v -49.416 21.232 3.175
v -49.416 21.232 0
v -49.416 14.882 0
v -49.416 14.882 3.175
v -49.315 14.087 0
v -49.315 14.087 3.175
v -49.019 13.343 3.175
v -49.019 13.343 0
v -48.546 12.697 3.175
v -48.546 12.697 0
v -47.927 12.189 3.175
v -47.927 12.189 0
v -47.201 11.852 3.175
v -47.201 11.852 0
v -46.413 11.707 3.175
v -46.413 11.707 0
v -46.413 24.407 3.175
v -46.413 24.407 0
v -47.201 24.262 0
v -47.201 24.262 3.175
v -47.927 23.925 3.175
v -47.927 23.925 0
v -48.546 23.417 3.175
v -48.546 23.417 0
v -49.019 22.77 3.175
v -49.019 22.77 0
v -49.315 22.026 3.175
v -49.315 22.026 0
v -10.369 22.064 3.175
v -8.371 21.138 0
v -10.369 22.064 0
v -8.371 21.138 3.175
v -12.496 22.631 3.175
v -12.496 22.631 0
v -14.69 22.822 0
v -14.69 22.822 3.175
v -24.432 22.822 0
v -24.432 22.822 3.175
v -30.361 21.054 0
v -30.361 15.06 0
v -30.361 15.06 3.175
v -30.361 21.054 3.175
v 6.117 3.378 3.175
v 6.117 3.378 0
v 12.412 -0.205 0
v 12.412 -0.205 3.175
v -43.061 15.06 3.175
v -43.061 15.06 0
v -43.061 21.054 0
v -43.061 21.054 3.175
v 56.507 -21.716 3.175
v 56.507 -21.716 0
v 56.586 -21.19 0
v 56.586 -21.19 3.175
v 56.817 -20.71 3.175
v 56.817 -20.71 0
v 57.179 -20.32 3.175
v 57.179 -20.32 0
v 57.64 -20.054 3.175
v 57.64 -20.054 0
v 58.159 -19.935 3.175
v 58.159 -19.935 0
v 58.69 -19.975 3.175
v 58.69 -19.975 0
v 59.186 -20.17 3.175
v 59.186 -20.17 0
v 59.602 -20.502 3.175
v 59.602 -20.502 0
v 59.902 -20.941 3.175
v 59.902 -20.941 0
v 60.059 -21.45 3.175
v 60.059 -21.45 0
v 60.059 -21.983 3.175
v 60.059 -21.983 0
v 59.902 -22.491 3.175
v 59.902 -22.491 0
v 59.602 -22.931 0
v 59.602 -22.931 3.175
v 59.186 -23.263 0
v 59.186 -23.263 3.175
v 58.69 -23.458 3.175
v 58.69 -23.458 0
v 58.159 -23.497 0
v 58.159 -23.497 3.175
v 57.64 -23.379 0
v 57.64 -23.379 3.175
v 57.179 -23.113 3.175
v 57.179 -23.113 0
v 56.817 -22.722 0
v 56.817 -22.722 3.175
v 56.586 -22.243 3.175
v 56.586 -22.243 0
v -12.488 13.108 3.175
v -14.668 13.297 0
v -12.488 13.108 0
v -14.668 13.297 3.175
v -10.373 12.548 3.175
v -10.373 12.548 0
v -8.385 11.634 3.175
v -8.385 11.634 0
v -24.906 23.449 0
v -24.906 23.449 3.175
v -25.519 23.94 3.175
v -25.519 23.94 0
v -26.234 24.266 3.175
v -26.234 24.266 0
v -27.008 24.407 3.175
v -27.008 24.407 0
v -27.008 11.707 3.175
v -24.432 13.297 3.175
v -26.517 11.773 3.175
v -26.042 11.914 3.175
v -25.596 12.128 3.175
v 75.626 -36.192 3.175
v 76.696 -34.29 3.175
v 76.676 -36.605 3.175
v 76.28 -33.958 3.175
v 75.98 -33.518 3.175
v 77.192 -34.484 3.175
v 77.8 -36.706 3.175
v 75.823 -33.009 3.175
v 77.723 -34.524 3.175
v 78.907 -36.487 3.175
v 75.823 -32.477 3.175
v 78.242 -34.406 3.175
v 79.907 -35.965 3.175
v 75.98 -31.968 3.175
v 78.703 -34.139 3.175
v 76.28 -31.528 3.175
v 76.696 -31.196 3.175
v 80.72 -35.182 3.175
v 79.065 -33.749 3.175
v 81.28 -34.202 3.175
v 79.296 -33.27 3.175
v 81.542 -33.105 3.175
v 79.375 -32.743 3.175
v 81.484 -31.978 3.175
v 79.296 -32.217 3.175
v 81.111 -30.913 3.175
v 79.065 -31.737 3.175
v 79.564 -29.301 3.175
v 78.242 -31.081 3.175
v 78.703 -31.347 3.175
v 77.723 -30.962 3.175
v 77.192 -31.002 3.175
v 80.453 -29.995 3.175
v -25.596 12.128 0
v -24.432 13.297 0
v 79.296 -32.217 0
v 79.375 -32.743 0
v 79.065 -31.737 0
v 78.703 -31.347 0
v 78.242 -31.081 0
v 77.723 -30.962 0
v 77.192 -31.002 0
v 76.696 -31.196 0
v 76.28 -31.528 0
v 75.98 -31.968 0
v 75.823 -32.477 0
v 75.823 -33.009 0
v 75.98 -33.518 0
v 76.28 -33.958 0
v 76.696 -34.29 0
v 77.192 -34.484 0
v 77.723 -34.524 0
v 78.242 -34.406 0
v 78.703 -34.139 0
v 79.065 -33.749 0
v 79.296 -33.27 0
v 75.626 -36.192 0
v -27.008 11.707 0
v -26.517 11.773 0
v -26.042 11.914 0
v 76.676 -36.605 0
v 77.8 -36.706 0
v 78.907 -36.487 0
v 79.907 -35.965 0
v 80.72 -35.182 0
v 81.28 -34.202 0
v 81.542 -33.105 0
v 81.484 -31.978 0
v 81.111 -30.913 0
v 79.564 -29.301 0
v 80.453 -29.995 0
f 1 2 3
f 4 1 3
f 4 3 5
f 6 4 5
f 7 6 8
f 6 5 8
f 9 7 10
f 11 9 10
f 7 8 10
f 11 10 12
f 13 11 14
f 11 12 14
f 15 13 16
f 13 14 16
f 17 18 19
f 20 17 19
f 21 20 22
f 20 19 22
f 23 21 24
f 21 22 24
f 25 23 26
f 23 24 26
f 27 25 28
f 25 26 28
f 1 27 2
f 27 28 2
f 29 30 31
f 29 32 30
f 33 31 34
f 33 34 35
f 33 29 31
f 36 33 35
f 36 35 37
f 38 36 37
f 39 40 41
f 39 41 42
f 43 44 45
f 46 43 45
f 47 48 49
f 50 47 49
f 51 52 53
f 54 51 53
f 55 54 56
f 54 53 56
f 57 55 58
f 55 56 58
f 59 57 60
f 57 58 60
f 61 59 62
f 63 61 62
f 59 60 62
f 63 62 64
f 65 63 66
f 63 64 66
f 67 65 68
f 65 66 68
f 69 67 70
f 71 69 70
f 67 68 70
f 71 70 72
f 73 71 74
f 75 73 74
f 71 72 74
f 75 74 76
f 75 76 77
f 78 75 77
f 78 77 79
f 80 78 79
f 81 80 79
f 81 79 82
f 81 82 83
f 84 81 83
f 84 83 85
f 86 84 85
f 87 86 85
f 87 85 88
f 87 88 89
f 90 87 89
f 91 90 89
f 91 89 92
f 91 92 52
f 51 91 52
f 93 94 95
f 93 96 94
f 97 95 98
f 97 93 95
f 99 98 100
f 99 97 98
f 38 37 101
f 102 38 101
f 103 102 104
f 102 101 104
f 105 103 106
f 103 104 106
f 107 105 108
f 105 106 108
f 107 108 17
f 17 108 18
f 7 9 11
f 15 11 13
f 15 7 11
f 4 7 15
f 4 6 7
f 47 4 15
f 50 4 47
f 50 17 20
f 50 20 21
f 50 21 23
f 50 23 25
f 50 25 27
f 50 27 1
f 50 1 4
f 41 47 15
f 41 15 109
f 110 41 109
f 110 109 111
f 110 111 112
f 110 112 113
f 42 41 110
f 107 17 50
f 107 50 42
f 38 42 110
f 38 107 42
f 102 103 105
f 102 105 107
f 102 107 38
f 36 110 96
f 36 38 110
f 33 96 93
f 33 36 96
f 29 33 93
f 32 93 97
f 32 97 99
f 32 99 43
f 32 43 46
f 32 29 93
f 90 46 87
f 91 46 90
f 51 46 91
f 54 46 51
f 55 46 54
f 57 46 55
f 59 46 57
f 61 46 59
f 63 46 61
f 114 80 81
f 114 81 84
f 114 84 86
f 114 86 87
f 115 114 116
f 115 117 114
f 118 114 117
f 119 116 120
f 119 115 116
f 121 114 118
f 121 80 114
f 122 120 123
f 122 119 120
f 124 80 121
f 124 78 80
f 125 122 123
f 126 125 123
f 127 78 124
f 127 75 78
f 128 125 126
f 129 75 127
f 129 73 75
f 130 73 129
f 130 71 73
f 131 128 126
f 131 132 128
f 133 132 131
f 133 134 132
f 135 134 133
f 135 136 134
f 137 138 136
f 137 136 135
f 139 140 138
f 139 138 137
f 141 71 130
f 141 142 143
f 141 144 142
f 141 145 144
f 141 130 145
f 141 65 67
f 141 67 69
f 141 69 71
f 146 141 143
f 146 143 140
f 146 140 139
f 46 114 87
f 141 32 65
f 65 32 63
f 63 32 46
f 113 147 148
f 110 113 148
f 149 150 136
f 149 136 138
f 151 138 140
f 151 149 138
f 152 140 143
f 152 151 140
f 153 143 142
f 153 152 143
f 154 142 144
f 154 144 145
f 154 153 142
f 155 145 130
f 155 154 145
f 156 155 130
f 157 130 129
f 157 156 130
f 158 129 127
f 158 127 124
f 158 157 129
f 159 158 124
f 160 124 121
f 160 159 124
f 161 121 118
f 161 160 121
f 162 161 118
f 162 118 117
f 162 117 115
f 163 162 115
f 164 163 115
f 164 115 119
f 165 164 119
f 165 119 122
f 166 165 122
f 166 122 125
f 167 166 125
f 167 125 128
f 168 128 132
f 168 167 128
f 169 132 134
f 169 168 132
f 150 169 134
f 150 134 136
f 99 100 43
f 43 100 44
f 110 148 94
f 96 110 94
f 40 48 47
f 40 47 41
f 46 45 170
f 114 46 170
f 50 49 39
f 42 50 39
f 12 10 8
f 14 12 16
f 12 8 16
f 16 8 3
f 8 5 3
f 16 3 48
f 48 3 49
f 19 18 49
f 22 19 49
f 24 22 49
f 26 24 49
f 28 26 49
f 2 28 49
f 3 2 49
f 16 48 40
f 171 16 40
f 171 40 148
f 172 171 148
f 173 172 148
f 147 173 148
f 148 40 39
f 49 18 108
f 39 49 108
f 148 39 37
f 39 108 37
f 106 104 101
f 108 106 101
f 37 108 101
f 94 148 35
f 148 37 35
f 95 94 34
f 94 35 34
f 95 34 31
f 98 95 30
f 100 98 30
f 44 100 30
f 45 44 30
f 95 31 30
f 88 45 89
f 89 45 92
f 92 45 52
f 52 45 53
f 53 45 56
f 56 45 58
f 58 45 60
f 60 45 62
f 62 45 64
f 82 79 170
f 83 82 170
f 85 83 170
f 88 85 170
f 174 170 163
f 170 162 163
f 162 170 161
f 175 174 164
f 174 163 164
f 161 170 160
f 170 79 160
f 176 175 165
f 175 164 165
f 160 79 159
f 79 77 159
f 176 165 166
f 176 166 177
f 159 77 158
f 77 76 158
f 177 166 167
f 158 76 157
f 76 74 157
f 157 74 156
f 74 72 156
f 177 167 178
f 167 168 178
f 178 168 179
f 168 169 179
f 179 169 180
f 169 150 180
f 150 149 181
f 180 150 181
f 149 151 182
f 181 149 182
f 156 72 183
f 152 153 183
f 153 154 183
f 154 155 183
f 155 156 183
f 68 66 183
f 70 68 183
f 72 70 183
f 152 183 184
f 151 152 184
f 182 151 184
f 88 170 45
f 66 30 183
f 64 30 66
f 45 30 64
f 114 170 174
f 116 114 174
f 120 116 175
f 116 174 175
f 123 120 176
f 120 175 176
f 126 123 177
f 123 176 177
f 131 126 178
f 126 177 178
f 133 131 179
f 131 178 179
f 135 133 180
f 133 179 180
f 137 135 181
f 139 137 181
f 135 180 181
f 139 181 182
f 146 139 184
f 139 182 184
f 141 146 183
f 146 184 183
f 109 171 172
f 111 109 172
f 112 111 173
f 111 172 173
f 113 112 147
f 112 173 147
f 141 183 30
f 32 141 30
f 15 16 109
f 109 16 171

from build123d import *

# Parameters (mm, degrees)
SKETCH1_R                       = 1.7859375
SKETCH1_W                       = 12.7
SKETCH1_H                       = 5.9944
BOSS_EXTRUDE1_DEPTH             = 3.175
FILLET2_R                       = 12.7
F_9_64_0_14063_DIAMETER_HOLE1_D = 3.572002


with BuildPart() as part:
    # Sketch1 → Boss-Extrude1 (new body)
    with BuildSketch(Plane.XY):
        with BuildLine():
            Line((-25.595614794, 12.127914856), (-24.431663343, 13.29684081))
            Line((-24.431663343, 13.29684081), (-11.306294, 13.29684081))
            Line((-11.306294, 13.29684081), (6.117359384, 3.377856252))
            Line((6.117359384, 3.377856252), (12.411791243, -0.205454953))
            Line((12.411791243, -0.205454953), (75.625928444, -36.192170077))
            ThreePointArc((75.625928444, -36.192170077), (81.03522907, -34.712213349), (79.564057068, -29.300516931))
            Line((79.564057068, -29.300516931), (-11.306294, 22.82184081))
            Line((-11.306294, 22.82184081), (-24.431663343, 22.82184081))
            ThreePointArc((-24.431663343, 22.82184081), (-25.519216943, 23.940247646), (-27.007802046, 24.406853559))
            Line((-27.007802046, 24.406853559), (-46.413402046, 24.406853559))
            ThreePointArc((-46.413402046, 24.406853559), (-48.546190424, 23.416669154), (-49.415576549, 21.231853559))
            Line((-49.415576549, 21.231853559), (-49.415576549, 14.881853559))
            ThreePointArc((-49.415576549, 14.881853559), (-48.546190424, 12.697037963), (-46.413402046, 11.706853559))
            Line((-46.413402046, 11.706853559), (-27.007802046, 11.706853559))
            ThreePointArc((-27.007802046, 11.706853559), (-26.27698161, 11.834453561), (-25.595614794, 12.127914856))
        make_face()
        with Locations((77.589397954, -32.743146441)):
            Circle(SKETCH1_R, mode=Mode.SUBTRACT)
        with Locations((-36.710602046, 18.056853559)):
            Rectangle(SKETCH1_W, SKETCH1_H, mode=Mode.SUBTRACT)
    extrude(amount=BOSS_EXTRUDE1_DEPTH)

    # Fillet2
    fillet2_edges = [part.edges().sort_by_distance(p)[0] for p in [
        (-11.306294, 22.82184081, 1.5875),
        (-11.306294, 13.29684081, 1.5875),
    ]]
    fillet(fillet2_edges, radius=FILLET2_R)

    # 9/64 (0.14063) Diameter Hole1 (through all)
    with Locations(Plane.XY.offset(3.175)):
        with Locations((58.292743709, -21.716371758)):
            Hole(F_9_64_0_14063_DIAMETER_HOLE1_D / 2)


solid = part.part
